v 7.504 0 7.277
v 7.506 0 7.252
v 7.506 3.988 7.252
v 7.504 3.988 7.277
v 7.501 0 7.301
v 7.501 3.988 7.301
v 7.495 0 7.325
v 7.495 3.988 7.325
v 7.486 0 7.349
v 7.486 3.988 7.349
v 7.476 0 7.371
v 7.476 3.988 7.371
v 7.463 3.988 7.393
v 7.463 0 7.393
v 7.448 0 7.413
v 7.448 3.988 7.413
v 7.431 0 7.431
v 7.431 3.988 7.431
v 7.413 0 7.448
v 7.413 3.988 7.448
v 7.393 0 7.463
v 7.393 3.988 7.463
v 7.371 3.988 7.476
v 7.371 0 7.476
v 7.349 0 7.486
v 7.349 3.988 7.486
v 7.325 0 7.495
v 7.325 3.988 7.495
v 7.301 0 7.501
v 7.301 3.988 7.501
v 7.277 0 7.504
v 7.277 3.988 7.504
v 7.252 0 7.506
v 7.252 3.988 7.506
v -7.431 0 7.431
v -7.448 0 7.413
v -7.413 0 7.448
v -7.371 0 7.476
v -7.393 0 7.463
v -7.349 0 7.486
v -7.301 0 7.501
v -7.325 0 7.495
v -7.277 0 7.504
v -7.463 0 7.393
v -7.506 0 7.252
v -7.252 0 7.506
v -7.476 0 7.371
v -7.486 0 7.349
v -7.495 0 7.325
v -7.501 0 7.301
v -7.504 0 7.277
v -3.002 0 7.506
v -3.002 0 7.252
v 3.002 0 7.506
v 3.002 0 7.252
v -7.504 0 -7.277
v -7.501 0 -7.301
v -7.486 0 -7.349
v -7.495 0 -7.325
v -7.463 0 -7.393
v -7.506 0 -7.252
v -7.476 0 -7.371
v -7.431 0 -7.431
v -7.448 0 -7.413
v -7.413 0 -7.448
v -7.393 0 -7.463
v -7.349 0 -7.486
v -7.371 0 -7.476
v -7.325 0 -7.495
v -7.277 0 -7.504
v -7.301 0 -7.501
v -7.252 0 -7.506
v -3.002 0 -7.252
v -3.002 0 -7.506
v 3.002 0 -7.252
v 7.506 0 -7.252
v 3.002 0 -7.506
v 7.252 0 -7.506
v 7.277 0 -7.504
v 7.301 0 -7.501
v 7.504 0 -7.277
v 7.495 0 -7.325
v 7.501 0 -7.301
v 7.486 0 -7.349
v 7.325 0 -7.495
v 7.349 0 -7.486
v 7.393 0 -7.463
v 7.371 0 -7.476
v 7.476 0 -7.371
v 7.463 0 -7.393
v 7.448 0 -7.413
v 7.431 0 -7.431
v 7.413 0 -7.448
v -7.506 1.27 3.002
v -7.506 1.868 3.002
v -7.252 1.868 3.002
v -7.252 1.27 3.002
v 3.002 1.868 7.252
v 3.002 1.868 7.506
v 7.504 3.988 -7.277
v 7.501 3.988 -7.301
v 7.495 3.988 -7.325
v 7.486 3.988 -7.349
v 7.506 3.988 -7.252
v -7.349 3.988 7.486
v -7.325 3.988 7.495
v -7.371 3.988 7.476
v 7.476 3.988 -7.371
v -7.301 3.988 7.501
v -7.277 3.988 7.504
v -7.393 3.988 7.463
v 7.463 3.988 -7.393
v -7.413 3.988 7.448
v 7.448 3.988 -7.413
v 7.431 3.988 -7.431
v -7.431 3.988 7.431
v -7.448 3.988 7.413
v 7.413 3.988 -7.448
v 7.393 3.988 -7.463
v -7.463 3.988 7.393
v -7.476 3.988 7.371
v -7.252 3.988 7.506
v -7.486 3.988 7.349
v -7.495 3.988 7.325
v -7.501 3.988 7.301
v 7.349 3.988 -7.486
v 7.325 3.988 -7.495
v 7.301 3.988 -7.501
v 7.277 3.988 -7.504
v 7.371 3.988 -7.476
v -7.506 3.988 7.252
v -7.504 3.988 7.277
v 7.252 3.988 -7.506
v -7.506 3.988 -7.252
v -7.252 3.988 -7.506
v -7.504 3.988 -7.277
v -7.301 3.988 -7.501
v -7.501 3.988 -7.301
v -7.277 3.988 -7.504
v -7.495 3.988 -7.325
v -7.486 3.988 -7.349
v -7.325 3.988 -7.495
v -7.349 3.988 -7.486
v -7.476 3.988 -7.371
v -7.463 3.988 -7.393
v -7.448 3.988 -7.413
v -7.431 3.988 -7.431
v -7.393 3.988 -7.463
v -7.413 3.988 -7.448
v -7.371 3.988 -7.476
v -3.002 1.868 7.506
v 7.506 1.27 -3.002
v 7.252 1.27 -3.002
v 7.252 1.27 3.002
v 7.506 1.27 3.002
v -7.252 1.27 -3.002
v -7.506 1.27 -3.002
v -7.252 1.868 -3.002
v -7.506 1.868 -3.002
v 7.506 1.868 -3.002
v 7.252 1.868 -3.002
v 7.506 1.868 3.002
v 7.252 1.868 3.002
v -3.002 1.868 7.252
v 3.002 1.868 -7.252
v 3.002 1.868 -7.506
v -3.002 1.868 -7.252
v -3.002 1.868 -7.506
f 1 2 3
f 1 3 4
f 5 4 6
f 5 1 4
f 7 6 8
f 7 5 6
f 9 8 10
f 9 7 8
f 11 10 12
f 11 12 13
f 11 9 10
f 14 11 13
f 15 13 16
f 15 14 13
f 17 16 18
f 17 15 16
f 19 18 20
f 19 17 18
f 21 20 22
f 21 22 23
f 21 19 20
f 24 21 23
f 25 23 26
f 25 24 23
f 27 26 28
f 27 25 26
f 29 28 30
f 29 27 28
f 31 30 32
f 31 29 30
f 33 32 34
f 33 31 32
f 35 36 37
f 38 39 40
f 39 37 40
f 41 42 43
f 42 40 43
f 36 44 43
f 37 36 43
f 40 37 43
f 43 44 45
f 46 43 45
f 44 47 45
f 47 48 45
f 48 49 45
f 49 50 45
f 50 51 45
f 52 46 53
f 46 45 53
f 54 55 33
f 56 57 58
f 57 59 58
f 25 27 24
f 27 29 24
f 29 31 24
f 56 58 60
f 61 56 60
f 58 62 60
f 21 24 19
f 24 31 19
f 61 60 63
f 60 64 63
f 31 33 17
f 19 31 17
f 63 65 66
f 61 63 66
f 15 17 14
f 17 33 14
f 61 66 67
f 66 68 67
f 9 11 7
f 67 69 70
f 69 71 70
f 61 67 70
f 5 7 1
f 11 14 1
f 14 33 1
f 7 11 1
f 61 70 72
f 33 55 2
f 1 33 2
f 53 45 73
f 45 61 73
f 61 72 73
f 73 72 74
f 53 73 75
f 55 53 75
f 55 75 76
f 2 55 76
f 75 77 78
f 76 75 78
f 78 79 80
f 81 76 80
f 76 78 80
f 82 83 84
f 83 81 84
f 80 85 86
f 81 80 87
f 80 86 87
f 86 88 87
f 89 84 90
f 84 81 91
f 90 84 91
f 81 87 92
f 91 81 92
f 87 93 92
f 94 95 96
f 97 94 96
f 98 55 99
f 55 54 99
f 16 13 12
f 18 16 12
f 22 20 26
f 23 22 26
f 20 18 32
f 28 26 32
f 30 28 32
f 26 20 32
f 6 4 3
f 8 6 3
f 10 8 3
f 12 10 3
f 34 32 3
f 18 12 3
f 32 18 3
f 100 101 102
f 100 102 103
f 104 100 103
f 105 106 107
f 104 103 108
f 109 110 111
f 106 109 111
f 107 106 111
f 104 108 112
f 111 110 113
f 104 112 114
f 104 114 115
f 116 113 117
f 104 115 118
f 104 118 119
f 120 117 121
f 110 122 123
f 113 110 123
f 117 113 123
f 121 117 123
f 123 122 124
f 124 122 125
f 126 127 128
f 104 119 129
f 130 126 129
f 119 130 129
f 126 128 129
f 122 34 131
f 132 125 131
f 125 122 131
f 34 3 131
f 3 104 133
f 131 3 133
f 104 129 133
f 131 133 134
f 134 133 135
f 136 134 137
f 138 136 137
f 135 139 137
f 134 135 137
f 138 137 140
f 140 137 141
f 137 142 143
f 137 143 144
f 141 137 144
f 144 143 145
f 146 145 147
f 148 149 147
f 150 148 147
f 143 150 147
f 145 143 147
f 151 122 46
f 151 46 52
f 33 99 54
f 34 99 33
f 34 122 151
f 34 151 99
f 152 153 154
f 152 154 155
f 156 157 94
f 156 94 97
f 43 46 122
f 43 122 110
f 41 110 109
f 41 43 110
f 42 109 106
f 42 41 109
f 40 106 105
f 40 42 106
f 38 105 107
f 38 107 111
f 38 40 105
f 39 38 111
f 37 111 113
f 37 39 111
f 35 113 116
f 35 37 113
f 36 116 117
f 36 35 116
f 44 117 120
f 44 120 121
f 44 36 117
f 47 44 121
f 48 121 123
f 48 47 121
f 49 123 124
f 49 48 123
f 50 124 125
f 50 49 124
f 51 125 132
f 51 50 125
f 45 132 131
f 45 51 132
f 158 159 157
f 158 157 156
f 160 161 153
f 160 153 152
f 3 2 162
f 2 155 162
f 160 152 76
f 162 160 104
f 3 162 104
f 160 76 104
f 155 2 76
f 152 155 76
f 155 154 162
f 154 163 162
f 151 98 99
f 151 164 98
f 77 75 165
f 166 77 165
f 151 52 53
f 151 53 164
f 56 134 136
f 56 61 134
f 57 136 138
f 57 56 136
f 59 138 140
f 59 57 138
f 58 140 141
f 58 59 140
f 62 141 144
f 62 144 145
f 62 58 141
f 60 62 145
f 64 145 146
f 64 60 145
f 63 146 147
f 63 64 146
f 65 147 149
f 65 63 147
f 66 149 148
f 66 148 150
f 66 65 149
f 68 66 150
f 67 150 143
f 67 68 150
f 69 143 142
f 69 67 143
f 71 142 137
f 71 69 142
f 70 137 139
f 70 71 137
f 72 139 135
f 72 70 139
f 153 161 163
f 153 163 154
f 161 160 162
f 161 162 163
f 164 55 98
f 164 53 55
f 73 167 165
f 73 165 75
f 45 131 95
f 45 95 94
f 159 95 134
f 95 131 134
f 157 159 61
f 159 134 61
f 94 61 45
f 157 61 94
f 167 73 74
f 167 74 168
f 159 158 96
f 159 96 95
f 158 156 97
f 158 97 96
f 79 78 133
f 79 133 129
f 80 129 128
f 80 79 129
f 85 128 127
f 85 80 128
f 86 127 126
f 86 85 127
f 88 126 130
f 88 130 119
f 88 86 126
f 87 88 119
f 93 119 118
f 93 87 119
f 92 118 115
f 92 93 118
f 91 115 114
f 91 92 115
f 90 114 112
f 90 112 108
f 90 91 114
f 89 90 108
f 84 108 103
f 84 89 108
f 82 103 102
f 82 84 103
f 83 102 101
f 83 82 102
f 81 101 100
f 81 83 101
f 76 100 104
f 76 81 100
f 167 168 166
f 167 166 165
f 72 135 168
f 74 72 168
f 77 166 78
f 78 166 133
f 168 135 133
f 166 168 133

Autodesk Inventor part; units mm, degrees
sketch "Sketch_31" plane through (0, 0, 0) normal (0, 0, 1) x (1, 0, 0)
  line L0 (-7.5057, 3.9878) -> (-7.5057, 0)
  line L1 (-7.5057, 0) -> (7.5057, 0)
  line L2 (7.5057, 0) -> (7.5057, 3.9878)
  line L3 (7.5057, 3.9878) -> (-7.5057, 3.9878)
extrude "Extrusion1" add sketch "Sketch_31" along normal mid plane 15.0114
sketch "Sketch_4" plane through (0, 0, 0) normal (0, 0, 1) x (1, 0, 0)
  line L0 (-7.5057, 1.27) -> (-7.2517, 1.27)
  line L1 (-7.2517, 1.27) -> (-7.2517, 1.8682)
  line L2 (-7.2517, 1.8682) -> (-7.5057, 1.8682)
  line L3 (-7.5057, 1.8682) -> (-7.5057, 1.27)
extrude "Extrusion2" cut sketch "Sketch_4" along normal mid plane 6.0046
sketch "Sketch_5" plane through (0, 0, 0) normal (0, 0, 1) x (1, 0, 0)
  line L0 (7.2517, 1.27) -> (7.5057, 1.27)
  line L1 (7.5057, 1.27) -> (7.5057, 1.8682)
  line L2 (7.5057, 1.8682) -> (7.2517, 1.8682)
  line L3 (7.2517, 1.8682) -> (7.2517, 1.27)
extrude "Extrusion3" cut sketch "Sketch_5" along normal mid plane 6.0046
sketch "Sketch_14" plane through (0, 0, 0) normal (1, 0, 0) x (0, 1, 0)
  line L0 (0, 7.5057) -> (0, 7.2517)
  line L1 (0, 7.2517) -> (1.8682, 7.2517)
  line L2 (1.8682, 7.2517) -> (1.8682, 7.5057)
  line L3 (1.8682, 7.5057) -> (0, 7.5057)
extrude "Extrusion4" cut sketch "Sketch_14" along normal mid plane 6.0046
sketch "Sketch_15" plane through (0, 0, 0) normal (1, 0, 0) x (0, 1, 0)
  line L0 (0, -7.2517) -> (0, -7.5057)
  line L1 (0, -7.5057) -> (1.8682, -7.5057)
  line L2 (1.8682, -7.5057) -> (1.8682, -7.2517)
  line L3 (1.8682, -7.2517) -> (0, -7.2517)
extrude "Extrusion5" cut sketch "Sketch_15" along normal mid plane 6.0046
sketch "Sketch_8" plane through (0, 0, 0) normal (0, 1, 0) x (-1, 0, 0)
  line L0 (8.2563, 8.2563) -> (-8.2563, 8.2563)
  line L1 (-8.2563, 8.2563) -> (-8.2563, -8.2563)
  line L2 (-8.2563, -8.2563) -> (8.2563, -8.2563)
  line L3 (8.2563, -8.2563) -> (8.2563, 8.2563)
  line L4 (7.5057, -7.2517) -> (7.5057, 7.2517)
  arc A0 (7.5057, 7.2517) -> (7.2517, 7.5057) centre (7.2517, 7.2517) ccw
  line L5 (7.2517, 7.5057) -> (-7.2517, 7.5057)
  arc A1 (-7.2517, 7.5057) -> (-7.5057, 7.2517) centre (-7.2517, 7.2517) ccw
  line L6 (-7.5057, 7.2517) -> (-7.5057, -7.2517)
  arc A2 (-7.5057, -7.2517) -> (-7.2517, -7.5057) centre (-7.2517, -7.2517) ccw
  line L7 (-7.2517, -7.5057) -> (7.2517, -7.5057)
  arc A3 (7.2517, -7.5057) -> (7.5057, -7.2517) centre (7.2517, -7.2517) ccw
extrude "Extrusion6" cut sketch "Sketch_8" along normal mid plane 10.5156
ref_plane "lens_to_bicol_led_1_XY" through (1.251, 3.9878, 4.9276) normal (0, 1, 0) x (1, 0, 0)
ref_plane "lens_to_bicol_led_1_YZ" through (1.251, 3.9878, 4.9276) normal (1, 0, 0) x (0, 0, -1)
ref_plane "lens_to_bicol_led_1_ZX" through (1.251, 3.9878, 4.9276) normal (0, 0, -1) x (0, 1, 0)
ref_plane "lens_to_bicol_led_2_XY" through (-1.251, 3.9878, 4.9276) normal (0, 1, 0) x (1, 0, 0)
ref_plane "lens_to_bicol_led_2_YZ" through (-1.251, 3.9878, 4.9276) normal (1, 0, 0) x (0, 0, -1)
ref_plane "lens_to_bicol_led_2_ZX" through (-1.251, 3.9878, 4.9276) normal (0, 0, -1) x (0, 1, 0)
ref_plane "lens_to_insert_XY" through (0, 2.9718, 0) normal (0, 1, 0) x (1, 0, 0)
ref_plane "lens_to_insert_YZ" through (0, 2.9718, 0) normal (1, 0, 0) x (0, 0, -1)
ref_plane "lens_to_insert_ZX" through (0, 2.9718, 0) normal (0, 0, -1) x (0, 1, 0)
ref_plane "lens_to_led_XY" through (0, 3.9878, 4.9276) normal (0, 1, 0) x (1, 0, 0)
ref_plane "lens_to_led_YZ" through (0, 3.9878, 4.9276) normal (1, 0, 0) x (0, 0, -1)
ref_plane "lens_to_led_ZX" through (0, 3.9878, 4.9276) normal (0, 0, -1) x (0, 1, 0)
ref_plane "lens_to_body_XY" through (0, 0, 0) normal (0, 1, 0) x (1, 0, 0)
ref_plane "lens_to_body_YZ" through (0, 0, 0) normal (1, 0, 0) x (0, 0, -1)
ref_plane "lens_to_body_ZX" through (0, 0, 0) normal (0, 0, -1) x (0, 1, 0)
properties part number "YB16SKW01-05-BB-BBni_lens"
